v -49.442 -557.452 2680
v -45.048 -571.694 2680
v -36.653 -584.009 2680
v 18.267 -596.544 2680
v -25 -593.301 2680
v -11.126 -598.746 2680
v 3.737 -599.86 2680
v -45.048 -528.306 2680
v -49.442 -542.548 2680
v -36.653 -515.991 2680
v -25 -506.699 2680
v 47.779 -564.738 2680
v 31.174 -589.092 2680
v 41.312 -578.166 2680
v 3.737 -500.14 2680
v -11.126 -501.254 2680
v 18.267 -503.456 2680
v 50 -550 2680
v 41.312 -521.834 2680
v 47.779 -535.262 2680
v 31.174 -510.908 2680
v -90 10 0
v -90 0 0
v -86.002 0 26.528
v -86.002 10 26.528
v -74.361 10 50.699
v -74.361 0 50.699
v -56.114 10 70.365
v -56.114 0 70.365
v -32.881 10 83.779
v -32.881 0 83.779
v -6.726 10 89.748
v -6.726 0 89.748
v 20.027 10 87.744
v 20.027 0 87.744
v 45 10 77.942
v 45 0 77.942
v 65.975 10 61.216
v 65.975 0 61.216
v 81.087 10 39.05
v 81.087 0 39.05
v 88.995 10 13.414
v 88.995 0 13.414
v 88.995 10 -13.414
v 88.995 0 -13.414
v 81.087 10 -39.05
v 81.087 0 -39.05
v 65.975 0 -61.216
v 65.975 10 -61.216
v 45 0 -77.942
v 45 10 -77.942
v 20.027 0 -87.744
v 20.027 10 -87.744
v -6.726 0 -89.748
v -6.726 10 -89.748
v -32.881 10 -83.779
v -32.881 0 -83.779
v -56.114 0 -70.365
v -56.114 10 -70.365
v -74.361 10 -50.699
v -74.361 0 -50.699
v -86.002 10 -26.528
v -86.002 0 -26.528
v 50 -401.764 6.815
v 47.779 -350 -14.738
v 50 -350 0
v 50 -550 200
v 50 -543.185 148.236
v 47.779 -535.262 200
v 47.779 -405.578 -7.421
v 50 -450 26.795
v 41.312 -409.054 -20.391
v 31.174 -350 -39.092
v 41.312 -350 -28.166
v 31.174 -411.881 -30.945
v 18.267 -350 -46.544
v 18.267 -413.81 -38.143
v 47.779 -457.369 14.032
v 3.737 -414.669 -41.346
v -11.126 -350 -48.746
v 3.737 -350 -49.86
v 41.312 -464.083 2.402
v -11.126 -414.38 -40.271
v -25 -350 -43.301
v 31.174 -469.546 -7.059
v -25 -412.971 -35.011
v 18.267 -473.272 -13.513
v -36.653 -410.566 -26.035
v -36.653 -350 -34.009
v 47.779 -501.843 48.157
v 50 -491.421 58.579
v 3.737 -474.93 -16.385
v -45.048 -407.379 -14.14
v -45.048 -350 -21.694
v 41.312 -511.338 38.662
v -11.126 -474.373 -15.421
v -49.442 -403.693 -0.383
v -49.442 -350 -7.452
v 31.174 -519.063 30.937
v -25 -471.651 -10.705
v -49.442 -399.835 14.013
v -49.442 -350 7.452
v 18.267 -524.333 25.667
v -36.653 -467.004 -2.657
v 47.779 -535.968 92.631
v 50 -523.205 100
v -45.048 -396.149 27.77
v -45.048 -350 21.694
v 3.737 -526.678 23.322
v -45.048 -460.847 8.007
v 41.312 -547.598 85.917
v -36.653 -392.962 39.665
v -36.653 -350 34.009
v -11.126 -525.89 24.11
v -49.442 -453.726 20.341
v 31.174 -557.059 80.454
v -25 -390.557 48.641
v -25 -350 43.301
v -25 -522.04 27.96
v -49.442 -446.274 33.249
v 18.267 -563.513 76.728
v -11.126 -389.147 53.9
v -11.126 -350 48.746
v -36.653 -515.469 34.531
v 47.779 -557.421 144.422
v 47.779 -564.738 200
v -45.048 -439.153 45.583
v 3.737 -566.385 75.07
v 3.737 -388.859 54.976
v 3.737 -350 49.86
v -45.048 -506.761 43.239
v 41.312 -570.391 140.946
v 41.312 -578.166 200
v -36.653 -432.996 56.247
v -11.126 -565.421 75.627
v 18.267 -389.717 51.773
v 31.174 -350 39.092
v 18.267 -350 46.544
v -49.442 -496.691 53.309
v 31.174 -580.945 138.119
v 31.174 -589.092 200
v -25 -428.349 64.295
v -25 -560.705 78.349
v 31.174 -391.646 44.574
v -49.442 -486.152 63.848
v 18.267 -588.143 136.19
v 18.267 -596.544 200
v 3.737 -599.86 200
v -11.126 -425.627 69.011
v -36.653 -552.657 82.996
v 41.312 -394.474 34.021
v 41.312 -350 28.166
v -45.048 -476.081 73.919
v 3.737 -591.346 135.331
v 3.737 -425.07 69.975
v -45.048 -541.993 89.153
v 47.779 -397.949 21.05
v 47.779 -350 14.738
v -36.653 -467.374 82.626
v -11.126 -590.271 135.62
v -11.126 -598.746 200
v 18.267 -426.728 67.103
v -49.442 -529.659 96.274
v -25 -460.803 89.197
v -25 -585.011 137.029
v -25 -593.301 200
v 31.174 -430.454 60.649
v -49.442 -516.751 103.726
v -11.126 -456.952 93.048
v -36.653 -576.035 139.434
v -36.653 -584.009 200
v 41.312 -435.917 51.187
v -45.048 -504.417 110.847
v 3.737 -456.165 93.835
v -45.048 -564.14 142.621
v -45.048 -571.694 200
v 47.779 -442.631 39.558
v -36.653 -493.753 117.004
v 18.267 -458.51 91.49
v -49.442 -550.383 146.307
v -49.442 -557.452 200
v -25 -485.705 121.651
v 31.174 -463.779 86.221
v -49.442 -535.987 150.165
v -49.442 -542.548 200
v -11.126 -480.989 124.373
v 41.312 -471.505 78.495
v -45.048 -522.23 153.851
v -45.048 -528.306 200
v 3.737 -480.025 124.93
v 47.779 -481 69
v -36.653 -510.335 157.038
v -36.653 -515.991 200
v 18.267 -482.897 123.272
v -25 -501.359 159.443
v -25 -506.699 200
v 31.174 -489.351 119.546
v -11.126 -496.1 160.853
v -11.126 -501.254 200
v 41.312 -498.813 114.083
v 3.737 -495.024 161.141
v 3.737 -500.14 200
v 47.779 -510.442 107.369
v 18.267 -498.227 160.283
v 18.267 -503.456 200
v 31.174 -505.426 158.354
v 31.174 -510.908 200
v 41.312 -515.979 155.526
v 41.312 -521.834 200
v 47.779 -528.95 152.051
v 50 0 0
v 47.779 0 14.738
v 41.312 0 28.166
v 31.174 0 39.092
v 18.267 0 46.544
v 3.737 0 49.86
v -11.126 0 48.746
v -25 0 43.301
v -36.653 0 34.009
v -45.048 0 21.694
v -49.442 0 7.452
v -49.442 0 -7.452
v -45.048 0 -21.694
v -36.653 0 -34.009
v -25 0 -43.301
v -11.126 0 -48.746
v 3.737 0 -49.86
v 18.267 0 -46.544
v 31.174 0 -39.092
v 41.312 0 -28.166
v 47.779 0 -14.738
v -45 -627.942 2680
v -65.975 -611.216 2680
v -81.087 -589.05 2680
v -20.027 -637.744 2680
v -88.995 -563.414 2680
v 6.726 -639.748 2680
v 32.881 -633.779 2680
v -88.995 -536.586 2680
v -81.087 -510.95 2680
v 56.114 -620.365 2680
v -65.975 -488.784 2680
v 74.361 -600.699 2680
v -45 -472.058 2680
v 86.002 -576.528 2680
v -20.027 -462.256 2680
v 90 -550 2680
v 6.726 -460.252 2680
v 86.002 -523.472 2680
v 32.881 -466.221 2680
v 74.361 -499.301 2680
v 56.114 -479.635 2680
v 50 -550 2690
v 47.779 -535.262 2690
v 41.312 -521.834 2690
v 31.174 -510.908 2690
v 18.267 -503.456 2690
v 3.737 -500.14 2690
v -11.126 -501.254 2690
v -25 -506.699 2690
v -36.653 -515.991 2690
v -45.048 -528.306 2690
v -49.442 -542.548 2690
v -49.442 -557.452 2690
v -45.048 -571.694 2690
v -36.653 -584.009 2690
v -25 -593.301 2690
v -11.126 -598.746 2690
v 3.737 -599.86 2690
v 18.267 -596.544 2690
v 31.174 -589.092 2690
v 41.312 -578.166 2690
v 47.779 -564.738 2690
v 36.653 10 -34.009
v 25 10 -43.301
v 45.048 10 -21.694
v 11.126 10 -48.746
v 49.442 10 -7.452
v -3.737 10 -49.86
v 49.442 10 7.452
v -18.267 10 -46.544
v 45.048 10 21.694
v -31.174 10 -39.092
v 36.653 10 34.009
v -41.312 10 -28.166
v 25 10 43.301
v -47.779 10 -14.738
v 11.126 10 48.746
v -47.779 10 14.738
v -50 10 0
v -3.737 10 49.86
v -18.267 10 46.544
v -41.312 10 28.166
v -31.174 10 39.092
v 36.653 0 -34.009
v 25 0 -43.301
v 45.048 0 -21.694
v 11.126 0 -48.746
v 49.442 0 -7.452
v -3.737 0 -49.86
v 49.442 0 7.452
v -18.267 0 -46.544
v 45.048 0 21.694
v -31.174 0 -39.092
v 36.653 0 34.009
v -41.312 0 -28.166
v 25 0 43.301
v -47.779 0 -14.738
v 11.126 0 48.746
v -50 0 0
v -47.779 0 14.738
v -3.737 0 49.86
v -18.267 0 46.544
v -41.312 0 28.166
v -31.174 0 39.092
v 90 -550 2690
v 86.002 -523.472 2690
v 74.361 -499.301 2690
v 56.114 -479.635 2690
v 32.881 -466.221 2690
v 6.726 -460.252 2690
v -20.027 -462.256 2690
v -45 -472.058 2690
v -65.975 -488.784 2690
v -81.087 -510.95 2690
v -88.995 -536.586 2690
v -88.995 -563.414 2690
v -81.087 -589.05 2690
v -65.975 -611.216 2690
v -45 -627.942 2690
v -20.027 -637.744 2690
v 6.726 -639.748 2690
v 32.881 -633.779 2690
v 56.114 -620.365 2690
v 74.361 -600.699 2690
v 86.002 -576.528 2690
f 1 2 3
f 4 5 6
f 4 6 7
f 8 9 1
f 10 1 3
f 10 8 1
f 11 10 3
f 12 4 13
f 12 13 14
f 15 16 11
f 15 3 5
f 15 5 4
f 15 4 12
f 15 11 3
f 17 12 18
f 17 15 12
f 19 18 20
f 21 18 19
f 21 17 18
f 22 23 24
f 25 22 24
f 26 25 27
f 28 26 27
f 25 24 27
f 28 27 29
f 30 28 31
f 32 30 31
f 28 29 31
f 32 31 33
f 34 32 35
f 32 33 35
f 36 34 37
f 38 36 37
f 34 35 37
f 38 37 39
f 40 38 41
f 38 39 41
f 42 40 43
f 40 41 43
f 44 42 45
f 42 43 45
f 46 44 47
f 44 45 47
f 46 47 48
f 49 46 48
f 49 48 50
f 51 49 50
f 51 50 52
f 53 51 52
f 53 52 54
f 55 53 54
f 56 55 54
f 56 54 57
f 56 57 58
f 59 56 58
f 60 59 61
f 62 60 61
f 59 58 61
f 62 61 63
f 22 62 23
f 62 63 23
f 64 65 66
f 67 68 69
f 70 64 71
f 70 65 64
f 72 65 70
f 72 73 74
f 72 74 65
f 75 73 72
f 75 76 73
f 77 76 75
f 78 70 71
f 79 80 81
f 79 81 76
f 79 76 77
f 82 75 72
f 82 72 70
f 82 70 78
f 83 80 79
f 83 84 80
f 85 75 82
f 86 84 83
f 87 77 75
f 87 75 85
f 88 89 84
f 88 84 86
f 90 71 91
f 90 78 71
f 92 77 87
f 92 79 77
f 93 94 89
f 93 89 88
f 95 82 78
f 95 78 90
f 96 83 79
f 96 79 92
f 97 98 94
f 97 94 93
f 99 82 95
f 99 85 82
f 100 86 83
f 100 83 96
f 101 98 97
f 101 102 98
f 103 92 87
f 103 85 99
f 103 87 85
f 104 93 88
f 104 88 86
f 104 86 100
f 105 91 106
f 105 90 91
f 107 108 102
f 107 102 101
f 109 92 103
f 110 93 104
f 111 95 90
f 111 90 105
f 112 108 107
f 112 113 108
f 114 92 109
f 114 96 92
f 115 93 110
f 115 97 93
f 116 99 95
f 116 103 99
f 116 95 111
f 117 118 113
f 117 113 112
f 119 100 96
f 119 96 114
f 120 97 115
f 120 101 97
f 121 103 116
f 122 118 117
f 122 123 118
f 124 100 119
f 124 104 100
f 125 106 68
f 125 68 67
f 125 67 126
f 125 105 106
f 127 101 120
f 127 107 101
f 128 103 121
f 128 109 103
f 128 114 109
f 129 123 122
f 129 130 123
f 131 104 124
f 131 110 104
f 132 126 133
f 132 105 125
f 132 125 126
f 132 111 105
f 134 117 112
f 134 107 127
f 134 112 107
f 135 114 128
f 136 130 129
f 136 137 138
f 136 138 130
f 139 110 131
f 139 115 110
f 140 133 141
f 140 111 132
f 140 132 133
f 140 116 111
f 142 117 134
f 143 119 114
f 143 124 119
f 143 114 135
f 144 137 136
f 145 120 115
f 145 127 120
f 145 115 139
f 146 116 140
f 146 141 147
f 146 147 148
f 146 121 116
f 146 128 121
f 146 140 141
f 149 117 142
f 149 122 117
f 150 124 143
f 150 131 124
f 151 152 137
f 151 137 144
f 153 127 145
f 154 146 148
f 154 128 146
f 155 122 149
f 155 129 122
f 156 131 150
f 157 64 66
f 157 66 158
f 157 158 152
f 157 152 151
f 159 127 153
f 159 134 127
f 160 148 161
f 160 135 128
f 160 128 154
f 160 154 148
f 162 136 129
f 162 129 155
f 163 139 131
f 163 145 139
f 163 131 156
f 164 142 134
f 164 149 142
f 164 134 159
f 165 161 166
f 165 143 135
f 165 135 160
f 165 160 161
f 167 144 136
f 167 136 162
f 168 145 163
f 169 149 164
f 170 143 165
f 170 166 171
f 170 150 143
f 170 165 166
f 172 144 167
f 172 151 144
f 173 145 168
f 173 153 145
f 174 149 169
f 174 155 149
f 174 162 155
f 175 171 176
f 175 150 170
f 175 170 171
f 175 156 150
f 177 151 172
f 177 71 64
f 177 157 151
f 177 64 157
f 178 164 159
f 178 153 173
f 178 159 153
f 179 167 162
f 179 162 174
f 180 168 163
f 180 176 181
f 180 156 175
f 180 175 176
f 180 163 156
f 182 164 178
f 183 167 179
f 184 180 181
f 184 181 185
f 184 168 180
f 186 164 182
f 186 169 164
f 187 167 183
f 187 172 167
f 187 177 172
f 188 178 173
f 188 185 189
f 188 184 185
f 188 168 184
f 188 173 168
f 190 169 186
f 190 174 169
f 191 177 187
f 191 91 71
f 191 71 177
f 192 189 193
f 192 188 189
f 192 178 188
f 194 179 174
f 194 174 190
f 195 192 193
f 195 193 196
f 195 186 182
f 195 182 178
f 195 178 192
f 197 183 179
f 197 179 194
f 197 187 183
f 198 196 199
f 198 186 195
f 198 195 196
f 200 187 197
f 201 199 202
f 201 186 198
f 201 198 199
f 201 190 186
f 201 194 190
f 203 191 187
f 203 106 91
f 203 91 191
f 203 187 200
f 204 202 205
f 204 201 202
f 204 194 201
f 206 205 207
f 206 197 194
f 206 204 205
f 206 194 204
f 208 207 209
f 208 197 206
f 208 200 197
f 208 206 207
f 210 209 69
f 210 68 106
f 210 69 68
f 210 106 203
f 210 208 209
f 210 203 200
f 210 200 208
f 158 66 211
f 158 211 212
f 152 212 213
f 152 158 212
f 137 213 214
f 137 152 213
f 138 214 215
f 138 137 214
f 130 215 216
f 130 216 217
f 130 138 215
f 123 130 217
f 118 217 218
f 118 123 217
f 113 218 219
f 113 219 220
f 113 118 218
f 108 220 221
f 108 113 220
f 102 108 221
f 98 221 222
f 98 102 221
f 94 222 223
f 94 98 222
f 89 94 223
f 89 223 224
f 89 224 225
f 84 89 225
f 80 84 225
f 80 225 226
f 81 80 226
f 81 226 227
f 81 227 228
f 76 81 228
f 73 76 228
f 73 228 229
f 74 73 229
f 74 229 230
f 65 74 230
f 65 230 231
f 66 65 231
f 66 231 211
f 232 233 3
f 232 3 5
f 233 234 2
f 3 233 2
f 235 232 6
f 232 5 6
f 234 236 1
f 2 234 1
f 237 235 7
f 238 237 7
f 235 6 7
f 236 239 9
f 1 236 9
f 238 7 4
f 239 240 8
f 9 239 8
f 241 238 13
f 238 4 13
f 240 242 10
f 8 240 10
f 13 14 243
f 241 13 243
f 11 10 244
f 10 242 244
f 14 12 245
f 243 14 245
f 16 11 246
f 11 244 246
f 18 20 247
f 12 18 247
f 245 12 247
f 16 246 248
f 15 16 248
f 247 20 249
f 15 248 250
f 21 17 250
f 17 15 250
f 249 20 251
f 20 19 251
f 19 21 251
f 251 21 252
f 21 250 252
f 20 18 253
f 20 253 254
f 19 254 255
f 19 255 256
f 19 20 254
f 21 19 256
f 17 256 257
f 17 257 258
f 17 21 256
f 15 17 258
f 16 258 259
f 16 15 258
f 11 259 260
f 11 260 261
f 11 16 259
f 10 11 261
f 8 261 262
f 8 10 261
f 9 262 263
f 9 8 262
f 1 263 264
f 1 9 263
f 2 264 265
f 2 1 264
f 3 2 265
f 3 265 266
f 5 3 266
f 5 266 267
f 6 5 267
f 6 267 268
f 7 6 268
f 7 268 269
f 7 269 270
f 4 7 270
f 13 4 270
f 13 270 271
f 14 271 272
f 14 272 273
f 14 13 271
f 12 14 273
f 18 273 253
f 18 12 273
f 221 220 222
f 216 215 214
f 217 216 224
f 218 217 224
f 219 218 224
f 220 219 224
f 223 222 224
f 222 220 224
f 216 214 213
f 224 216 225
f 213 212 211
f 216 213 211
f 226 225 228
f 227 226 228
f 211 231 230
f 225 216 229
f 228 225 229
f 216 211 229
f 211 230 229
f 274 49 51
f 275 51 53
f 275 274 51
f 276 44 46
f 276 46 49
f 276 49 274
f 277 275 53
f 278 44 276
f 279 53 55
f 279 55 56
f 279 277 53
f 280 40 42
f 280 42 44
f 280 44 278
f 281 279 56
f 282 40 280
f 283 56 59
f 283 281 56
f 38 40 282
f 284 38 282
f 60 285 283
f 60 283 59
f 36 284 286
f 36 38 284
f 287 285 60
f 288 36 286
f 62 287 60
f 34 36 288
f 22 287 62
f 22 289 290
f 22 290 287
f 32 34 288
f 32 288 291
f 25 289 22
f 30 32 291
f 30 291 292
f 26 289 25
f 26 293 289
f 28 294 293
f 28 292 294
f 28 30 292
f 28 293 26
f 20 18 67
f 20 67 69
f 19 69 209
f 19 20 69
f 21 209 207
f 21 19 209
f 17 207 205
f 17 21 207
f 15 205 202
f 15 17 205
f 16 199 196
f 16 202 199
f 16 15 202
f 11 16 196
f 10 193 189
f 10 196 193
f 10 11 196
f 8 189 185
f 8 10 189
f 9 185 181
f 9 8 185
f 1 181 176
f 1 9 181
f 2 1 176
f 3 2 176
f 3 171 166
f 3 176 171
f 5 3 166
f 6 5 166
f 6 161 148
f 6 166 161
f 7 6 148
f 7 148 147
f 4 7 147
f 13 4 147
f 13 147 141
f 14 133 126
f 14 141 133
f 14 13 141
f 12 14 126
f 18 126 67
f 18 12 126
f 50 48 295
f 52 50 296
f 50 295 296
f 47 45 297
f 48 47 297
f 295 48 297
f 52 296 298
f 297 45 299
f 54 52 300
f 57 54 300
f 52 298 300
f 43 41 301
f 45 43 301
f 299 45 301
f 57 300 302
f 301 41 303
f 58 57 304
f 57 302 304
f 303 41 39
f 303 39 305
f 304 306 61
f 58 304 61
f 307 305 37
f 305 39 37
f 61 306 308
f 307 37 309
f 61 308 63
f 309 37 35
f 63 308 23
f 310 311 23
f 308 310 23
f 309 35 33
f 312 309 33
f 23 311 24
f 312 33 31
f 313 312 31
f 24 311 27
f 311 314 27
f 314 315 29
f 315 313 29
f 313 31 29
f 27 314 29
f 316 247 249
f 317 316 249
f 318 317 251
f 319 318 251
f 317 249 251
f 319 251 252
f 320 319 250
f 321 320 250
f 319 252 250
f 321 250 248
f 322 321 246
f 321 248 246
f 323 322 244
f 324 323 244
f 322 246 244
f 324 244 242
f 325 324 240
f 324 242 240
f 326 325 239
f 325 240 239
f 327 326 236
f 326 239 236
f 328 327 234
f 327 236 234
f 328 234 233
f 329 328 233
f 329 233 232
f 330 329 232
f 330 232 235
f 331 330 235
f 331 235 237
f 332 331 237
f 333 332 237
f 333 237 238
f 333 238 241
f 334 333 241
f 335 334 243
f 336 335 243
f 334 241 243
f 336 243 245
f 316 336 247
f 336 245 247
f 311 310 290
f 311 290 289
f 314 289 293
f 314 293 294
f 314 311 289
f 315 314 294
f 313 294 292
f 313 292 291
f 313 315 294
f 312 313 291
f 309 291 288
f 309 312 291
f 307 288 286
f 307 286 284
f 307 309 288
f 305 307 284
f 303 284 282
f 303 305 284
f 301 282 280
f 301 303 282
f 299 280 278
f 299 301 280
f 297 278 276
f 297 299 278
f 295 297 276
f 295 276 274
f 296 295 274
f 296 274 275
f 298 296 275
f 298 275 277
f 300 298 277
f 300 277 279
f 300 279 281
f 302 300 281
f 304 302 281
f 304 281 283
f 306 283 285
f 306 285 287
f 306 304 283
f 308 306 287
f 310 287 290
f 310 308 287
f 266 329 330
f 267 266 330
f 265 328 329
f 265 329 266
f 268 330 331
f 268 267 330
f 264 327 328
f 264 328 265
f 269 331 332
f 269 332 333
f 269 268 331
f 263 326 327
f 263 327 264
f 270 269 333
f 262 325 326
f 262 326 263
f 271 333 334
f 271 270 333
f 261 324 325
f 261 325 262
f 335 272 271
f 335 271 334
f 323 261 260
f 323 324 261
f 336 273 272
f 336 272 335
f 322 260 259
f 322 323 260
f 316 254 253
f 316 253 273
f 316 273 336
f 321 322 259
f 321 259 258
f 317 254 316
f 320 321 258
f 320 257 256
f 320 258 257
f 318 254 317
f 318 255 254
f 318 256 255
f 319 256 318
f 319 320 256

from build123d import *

# Parameters (mm, degrees)
F0_R     = 50
F3_R     = 90
F3_R_2   = 50
F4_DEPTH = 10
F5_R     = 90
F5_R_2   = 50
F6_DEPTH = 10


with BuildPart() as f2:
    # F2: sweep along a path in F1
    with BuildLine(Plane.YZ) as f2_path:
        Line((0, 0), (-350, 0))
        ThreePointArc((-350, 0), (-491.4213562373, 58.5786437627), (-550, 200))
        Line((-550, 200), (-550, 2680))
    # F0 (on Front) → F2 (sweep)
    with BuildSketch(Plane.XZ):
        Circle(F0_R)
    sweep(path=f2_path.line)


with BuildPart() as f4:
    # F3 (on face) → F4 (new body)
    with BuildSketch(Plane(origin=(0, 0, 0), x_dir=(-1, 0, 0), z_dir=(0, 1, 0))):
        Circle(F3_R)
        Circle(F3_R_2, mode=Mode.SUBTRACT)
    extrude(amount=F4_DEPTH)


with BuildPart() as f6:
    # F5 (on face) → F6 (new body)
    with BuildSketch(Plane.XY.offset(2680)):
        with Locations((0, -550)):
            Circle(F5_R)
        with Locations((0, -550)):
            Circle(F5_R_2, mode=Mode.SUBTRACT)
    extrude(amount=F6_DEPTH)


solid = Compound([f2.part, f4.part, f6.part])
